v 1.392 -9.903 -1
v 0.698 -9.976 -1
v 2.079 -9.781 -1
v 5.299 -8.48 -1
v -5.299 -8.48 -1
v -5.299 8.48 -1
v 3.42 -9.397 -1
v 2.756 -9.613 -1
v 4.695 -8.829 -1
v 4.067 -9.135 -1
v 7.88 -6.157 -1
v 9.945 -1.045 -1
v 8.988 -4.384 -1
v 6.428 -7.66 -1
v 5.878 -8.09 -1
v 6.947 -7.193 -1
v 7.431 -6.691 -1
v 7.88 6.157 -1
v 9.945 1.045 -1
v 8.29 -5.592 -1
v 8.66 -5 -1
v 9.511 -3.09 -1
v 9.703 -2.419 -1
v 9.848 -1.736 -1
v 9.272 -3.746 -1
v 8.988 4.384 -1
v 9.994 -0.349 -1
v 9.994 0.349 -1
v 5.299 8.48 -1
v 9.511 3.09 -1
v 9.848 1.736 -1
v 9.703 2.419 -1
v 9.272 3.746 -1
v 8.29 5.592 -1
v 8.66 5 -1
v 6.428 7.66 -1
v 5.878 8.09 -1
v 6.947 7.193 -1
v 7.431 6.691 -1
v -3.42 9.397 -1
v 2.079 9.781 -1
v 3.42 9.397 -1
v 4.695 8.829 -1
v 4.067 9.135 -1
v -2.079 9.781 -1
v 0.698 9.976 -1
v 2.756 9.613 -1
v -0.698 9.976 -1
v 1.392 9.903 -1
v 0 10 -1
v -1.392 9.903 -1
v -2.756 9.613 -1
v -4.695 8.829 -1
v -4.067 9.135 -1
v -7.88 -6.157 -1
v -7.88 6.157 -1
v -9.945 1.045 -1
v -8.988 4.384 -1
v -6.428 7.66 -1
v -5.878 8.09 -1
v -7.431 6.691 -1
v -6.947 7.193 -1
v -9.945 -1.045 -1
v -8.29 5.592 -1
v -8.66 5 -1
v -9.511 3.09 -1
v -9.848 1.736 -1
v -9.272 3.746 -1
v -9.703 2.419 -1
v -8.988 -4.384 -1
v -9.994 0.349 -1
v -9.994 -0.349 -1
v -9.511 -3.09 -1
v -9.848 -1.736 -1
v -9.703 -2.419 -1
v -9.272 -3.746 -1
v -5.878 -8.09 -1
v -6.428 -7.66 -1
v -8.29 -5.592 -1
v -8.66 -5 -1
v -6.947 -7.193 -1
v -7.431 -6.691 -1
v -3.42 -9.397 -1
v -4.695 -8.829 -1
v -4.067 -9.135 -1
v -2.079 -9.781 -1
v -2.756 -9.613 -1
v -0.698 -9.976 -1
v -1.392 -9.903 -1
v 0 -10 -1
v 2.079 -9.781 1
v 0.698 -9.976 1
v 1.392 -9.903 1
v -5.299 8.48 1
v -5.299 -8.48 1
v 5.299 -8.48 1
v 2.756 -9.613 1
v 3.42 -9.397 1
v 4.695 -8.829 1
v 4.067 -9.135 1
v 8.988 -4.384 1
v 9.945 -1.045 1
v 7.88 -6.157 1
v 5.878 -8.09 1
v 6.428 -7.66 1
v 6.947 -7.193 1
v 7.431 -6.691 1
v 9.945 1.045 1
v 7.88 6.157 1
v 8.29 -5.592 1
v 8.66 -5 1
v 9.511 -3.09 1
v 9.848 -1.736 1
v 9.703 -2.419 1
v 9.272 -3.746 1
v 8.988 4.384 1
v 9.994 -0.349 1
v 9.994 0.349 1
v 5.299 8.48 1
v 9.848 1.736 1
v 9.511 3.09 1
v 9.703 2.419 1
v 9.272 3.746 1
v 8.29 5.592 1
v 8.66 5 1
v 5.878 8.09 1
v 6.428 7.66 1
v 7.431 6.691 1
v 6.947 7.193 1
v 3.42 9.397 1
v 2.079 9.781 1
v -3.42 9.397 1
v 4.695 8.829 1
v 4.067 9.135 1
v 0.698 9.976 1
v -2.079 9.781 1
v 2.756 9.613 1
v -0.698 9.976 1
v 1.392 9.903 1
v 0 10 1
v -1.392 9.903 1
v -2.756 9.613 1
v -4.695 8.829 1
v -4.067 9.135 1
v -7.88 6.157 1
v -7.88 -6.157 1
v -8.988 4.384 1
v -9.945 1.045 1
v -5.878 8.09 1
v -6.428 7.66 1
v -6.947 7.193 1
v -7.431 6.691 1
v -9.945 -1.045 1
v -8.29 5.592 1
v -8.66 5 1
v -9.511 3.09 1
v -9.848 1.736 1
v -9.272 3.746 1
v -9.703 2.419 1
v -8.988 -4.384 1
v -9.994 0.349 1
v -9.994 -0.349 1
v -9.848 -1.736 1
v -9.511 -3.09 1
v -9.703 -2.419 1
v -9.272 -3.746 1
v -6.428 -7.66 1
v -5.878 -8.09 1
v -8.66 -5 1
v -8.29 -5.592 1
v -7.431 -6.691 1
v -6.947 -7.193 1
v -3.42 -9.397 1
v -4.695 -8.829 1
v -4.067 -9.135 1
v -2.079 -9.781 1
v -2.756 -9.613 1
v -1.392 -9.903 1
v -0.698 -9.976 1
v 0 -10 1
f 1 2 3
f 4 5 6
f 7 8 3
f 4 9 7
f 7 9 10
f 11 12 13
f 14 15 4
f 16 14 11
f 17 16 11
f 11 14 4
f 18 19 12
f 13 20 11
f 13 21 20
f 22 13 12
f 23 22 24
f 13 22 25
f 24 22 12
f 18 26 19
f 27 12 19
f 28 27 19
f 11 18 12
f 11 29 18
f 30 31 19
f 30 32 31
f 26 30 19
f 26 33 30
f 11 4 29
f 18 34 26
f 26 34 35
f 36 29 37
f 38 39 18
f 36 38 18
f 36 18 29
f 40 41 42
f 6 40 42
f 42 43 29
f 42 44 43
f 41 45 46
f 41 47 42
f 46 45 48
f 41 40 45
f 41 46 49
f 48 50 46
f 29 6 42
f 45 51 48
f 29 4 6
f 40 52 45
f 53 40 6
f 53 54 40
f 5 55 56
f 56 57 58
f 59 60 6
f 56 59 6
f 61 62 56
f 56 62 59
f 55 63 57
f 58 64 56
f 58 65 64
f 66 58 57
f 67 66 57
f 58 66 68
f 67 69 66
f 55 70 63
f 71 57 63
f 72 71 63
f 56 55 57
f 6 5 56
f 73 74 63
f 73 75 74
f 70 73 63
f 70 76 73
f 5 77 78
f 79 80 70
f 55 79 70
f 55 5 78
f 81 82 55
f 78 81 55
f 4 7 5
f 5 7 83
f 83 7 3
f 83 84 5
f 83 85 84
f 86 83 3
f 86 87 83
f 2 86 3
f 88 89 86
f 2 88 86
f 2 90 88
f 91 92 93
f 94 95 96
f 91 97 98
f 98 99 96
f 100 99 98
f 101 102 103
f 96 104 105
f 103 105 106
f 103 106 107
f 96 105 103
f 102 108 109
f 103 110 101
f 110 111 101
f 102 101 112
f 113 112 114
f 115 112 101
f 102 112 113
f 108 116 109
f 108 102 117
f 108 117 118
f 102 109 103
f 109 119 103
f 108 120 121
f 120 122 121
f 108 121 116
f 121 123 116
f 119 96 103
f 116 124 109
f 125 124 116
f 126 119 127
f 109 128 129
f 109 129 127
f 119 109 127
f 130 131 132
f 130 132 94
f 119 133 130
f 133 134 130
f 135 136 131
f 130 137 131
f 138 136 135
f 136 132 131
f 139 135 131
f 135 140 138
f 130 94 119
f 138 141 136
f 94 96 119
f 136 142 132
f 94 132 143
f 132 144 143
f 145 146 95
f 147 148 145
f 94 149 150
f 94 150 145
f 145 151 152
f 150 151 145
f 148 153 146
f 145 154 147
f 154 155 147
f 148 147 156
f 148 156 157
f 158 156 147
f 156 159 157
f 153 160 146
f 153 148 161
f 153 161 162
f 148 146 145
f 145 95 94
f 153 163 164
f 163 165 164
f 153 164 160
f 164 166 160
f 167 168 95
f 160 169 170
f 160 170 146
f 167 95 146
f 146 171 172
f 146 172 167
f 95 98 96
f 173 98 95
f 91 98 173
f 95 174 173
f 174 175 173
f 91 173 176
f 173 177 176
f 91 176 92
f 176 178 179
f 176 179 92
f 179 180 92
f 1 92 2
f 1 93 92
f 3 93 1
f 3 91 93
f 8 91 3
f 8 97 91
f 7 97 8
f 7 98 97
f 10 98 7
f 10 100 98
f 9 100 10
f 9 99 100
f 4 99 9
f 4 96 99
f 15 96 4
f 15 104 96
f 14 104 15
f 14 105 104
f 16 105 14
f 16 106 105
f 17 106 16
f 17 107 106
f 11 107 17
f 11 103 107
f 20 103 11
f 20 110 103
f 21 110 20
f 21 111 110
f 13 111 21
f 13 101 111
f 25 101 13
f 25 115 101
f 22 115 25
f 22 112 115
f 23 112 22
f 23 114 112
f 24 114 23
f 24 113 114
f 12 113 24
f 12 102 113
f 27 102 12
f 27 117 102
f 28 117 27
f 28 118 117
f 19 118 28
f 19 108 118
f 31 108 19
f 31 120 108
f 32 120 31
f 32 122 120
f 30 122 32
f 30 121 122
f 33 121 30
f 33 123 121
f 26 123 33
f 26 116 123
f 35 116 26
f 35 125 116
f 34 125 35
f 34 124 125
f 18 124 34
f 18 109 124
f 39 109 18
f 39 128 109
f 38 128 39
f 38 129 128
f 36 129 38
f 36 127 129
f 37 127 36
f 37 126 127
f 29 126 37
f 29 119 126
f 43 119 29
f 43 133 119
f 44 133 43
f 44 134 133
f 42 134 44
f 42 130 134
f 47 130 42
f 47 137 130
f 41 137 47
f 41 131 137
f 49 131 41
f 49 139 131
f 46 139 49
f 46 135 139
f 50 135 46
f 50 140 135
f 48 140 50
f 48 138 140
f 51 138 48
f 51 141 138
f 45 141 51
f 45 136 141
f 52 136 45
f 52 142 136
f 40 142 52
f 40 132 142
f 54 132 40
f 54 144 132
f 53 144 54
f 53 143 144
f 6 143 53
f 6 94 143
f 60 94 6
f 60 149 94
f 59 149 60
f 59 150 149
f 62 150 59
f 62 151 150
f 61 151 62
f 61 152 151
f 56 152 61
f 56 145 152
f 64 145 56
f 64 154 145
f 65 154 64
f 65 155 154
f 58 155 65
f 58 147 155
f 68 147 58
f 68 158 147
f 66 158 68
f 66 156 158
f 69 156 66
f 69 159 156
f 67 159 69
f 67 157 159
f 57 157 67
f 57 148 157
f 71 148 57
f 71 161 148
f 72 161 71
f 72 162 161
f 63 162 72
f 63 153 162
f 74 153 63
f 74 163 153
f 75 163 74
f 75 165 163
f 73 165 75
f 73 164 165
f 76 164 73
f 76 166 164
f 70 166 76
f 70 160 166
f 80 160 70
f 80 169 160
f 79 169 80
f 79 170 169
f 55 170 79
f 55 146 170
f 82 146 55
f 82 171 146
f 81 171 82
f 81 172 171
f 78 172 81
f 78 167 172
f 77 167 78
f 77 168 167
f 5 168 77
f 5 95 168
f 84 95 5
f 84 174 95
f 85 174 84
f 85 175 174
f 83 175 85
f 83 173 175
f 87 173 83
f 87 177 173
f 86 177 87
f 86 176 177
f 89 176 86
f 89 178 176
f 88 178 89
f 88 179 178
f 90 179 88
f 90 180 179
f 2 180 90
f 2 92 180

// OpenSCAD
//
//  A wobbly circle polygon
//  Sarah Kelley, 8/26/2020
//

radius = 10;  // [0:20]
wobble = $t*20;  // [0:50]
wobbleRadius = 2; // [1:20]
step = 4;     // [1:90]

module wobblyCircleExtrude(
    radius=10, wobble=6, wobbleRadius=2, step=4, 
    height=10,
    convexity=10) 
{        
    function circleFn(r, wobble, wobbleRadius, deg) =
        let(bar=r-(sin(deg*wobble)*wobbleRadius))
            [bar*sin(deg),bar*cos(deg)];

    circlePoints = [for (deg=[0:step:360]) 
        circleFn(radius,wobble, wobbleRadius, deg)];
    circlePath = 
        concat([ for (i=[0:len(circlePoints)-1]) i ],0);
    
    linear_extrude(height=height, center=true, convexity=convexity)
        polygon(circlePoints, [circlePath]);
}
wobblyCircleExtrude(radius, wobble, wobbleRadius, step,
        height=2);


/*
for (z = [0:.1:.5]) {
    translate([0,0,z*3]) rotate([0,0,z*60])
    wobblyCircleExtrude(radius, wobble, wobbleRadius, step,
        height=2);
}
*/
